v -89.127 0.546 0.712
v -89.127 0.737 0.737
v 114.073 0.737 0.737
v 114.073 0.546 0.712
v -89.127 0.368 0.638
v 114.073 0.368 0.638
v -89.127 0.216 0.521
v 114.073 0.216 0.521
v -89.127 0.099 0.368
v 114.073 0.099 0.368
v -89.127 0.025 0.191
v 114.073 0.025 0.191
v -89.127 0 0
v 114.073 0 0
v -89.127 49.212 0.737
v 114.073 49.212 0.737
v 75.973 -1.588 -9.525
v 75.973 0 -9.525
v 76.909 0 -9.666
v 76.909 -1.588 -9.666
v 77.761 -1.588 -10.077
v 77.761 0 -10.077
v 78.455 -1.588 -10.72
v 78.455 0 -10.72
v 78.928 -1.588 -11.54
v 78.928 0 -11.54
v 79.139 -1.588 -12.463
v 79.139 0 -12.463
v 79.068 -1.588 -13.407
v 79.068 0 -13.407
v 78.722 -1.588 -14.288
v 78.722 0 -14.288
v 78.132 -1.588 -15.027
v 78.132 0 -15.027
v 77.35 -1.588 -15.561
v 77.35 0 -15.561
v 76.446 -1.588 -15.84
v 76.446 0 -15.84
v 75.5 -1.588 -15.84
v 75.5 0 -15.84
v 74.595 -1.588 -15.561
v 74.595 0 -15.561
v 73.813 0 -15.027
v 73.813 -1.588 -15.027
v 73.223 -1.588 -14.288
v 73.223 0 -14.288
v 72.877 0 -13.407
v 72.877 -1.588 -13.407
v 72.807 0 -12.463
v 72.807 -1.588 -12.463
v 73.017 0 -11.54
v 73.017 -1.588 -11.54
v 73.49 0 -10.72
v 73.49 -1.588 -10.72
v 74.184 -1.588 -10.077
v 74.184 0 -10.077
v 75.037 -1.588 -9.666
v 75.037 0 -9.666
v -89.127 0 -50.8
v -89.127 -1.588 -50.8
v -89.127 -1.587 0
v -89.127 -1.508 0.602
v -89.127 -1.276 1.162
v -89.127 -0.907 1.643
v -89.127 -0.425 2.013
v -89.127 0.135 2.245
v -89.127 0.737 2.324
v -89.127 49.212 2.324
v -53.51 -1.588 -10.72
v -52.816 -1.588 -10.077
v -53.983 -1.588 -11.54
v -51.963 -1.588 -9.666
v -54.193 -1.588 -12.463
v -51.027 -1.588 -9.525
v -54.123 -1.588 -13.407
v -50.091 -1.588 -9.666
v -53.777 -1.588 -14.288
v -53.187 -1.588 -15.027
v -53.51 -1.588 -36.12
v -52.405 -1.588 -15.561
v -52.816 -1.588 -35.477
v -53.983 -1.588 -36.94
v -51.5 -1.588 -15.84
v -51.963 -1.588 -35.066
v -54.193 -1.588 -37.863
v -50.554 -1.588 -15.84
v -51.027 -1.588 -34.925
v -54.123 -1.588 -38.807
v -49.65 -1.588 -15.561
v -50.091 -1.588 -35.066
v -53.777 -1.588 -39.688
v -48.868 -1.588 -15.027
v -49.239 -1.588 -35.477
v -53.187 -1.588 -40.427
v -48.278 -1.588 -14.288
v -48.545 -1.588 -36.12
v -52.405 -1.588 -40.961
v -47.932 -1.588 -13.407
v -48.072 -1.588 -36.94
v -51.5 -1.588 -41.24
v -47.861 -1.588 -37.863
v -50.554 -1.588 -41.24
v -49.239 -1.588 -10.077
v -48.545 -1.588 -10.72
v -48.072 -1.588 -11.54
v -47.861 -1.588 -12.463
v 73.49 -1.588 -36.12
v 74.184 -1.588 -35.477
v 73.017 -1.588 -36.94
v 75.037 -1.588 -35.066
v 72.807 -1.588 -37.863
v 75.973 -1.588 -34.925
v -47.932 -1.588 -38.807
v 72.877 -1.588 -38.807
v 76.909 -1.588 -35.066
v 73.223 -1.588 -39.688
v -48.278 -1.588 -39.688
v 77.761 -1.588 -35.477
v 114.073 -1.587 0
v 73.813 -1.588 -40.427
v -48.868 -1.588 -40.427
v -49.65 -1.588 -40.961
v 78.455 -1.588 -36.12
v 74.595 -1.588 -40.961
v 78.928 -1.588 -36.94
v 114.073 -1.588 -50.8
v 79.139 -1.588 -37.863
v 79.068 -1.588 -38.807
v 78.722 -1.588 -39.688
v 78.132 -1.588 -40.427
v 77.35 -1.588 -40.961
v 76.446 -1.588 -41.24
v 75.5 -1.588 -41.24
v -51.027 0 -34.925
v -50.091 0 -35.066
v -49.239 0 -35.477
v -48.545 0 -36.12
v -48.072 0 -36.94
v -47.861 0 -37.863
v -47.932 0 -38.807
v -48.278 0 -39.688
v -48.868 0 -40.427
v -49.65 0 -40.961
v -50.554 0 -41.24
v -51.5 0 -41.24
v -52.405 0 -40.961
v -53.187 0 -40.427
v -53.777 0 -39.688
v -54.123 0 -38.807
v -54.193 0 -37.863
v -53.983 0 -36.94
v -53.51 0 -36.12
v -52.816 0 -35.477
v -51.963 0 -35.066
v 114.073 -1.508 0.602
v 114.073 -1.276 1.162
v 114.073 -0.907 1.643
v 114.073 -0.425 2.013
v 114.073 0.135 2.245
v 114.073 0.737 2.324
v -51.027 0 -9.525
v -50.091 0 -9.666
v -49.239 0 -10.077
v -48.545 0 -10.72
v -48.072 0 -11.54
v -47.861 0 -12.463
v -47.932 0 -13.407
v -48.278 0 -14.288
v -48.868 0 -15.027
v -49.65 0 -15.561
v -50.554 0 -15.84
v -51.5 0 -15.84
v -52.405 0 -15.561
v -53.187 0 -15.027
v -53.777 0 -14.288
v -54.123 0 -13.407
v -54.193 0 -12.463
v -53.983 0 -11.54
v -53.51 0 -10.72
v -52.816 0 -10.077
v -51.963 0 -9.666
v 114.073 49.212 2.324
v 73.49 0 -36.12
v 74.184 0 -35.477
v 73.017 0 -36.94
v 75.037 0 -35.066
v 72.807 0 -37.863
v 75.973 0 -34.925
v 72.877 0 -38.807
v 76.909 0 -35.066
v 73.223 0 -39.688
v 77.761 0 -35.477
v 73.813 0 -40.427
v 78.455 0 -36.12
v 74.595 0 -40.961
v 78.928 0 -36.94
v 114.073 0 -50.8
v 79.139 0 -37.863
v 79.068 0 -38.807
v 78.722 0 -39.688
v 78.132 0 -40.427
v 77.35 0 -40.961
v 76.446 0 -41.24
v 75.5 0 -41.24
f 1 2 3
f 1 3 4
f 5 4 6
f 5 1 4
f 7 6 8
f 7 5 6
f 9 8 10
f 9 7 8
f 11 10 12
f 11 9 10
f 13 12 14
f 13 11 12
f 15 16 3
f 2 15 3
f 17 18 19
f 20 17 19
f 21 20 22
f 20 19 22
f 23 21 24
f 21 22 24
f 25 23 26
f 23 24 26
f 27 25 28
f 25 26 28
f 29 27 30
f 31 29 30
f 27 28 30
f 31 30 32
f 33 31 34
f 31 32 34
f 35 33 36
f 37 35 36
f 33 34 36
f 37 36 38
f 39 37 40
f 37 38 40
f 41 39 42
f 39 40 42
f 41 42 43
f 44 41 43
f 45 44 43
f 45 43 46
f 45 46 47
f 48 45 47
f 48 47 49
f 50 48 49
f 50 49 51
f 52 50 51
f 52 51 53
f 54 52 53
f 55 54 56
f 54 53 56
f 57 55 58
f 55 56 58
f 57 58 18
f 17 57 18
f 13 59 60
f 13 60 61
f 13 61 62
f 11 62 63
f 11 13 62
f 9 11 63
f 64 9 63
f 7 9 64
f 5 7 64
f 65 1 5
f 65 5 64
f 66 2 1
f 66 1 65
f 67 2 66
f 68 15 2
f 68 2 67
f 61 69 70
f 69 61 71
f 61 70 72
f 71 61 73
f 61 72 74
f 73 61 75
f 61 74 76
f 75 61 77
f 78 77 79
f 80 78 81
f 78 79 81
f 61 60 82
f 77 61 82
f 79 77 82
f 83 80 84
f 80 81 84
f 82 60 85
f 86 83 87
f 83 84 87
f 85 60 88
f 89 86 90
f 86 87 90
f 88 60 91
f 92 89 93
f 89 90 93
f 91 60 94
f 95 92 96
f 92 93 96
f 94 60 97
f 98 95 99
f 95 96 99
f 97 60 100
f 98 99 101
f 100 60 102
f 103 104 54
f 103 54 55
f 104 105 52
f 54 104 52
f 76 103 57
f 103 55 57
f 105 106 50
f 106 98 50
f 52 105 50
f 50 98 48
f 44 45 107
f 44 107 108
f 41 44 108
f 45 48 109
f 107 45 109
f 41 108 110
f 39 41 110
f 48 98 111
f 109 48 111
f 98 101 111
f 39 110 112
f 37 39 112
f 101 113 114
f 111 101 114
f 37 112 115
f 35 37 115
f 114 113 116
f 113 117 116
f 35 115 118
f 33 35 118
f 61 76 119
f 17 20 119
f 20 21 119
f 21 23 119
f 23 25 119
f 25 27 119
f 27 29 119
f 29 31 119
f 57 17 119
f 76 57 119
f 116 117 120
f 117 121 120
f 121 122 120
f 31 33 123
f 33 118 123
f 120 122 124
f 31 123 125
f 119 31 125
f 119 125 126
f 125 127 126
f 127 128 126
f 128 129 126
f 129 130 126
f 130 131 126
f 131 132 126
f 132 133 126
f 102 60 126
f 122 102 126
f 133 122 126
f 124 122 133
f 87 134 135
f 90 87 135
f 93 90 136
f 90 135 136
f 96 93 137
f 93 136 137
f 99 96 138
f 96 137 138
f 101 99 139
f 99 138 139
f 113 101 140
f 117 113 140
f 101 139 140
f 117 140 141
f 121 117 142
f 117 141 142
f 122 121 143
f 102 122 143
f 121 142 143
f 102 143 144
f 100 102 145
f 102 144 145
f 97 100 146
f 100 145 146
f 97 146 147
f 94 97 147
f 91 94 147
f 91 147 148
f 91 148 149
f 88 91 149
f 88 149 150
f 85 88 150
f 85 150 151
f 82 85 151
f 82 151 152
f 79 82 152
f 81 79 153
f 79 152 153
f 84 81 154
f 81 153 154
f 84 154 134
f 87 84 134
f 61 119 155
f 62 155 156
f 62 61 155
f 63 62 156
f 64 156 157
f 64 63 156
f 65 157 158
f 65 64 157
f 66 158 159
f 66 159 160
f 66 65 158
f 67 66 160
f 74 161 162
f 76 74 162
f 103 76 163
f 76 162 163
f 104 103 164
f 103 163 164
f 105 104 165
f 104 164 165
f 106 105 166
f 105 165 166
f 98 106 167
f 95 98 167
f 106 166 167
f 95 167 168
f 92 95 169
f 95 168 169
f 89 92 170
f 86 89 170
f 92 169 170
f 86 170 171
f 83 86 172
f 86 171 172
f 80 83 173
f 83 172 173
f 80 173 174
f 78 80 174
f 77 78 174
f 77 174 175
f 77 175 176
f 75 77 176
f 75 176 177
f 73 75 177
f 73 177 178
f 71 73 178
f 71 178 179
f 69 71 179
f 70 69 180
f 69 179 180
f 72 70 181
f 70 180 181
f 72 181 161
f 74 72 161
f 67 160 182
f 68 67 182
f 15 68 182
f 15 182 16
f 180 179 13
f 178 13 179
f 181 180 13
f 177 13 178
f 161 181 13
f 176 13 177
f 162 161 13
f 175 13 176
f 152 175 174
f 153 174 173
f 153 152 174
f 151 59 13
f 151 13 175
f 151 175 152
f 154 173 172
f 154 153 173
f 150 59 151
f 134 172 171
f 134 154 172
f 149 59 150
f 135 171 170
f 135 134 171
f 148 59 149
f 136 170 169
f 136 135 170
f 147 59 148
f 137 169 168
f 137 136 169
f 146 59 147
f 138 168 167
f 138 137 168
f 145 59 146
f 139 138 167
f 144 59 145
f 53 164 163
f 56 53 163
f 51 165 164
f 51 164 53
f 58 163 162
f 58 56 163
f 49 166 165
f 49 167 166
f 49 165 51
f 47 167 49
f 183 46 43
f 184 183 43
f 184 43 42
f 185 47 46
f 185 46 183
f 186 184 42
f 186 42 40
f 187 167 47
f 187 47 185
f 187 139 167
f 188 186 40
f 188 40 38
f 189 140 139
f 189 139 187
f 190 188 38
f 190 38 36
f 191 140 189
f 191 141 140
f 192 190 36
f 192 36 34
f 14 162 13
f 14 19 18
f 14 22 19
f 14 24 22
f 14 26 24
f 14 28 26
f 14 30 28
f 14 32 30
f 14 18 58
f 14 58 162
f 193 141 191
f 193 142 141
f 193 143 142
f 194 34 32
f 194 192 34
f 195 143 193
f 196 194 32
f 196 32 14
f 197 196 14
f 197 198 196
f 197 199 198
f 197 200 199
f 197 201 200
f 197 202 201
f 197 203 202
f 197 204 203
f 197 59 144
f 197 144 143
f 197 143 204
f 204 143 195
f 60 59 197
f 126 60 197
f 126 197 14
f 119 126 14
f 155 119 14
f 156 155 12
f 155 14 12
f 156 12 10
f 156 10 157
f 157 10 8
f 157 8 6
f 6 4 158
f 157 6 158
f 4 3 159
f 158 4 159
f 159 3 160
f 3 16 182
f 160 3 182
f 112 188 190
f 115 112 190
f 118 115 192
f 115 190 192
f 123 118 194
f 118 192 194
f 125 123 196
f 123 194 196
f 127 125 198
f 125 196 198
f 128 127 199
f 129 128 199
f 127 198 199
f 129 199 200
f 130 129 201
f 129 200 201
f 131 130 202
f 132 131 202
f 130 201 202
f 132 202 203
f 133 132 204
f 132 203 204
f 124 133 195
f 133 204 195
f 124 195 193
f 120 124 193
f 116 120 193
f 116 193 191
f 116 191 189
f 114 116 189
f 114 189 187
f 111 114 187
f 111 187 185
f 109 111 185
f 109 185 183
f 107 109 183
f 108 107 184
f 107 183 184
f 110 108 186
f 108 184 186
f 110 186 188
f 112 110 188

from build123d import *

# Parameters (mm, degrees)
SKETCH1_W          = 203.2
SKETCH1_H          = 50.8
BASE_FLANGE1_DEPTH = 1.5875
EDGE_FLANGE3_DEPTH = 203.2
SKETCH15_R         = 3.175
CUT_EXTRUDE1_DEPTH = 1.5875


# Sheet-metal steps are written as plain solids
with BuildPart() as part:
    # Sketch1 → Base-Flange1 (new body)
    with BuildSketch(Plane(origin=(0, 0, 0), x_dir=(1, 0, 0), z_dir=(0, 1, 0))):
        with Locations((12.472748517, 25.4)):
            Rectangle(SKETCH1_W, SKETCH1_H)
    extrude(amount=-BASE_FLANGE1_DEPTH)

    # Edge-Flange3 section (across the edge) → Edge-Flange3 (add)
    with BuildSketch(Plane(origin=(-89.127251483, 0, 0.7366), x_dir=(0, 0, -1), z_dir=(1, 0, 0))):
        with BuildLine():
            Line((-1.5875, 0.7366), (-1.5875, 49.2125))
            Line((-1.5875, 49.2125), (0, 49.2125))
            Line((0, 49.2125), (0, 0.7366))
            ThreePointArc((0, 0.7366), (0.215745145, 0.215745145), (0.7366, 0))
            Line((0.7366, 0), (0.7366, -1.5875))
            ThreePointArc((0.7366, -1.5875), (-0.90678687, -0.90678687), (-1.5875, 0.7366))
        make_face()
    extrude(amount=EDGE_FLANGE3_DEPTH)

    # Sketch15 → Cut-Extrude1 (cut)
    with BuildSketch(Plane(origin=(0, 0, 0), x_dir=(1, 0, 0), z_dir=(0, 1, 0))):
        with Locations(Location((-51.027251483, 38.1, 0), (0, 0, 270))):
            Circle(SKETCH15_R)
        with Locations(Location((75.972748517, 38.1, 0), (0, 0, 270))):
            Circle(SKETCH15_R)
        with Locations(Location((-51.027251483, 12.7, 0), (0, 0, 270))):
            Circle(SKETCH15_R)
        with Locations(Location((75.972748517, 12.7, 0), (0, 0, 270))):
            Circle(SKETCH15_R)
    extrude(amount=-CUT_EXTRUDE1_DEPTH, mode=Mode.SUBTRACT)


solid = part.part
